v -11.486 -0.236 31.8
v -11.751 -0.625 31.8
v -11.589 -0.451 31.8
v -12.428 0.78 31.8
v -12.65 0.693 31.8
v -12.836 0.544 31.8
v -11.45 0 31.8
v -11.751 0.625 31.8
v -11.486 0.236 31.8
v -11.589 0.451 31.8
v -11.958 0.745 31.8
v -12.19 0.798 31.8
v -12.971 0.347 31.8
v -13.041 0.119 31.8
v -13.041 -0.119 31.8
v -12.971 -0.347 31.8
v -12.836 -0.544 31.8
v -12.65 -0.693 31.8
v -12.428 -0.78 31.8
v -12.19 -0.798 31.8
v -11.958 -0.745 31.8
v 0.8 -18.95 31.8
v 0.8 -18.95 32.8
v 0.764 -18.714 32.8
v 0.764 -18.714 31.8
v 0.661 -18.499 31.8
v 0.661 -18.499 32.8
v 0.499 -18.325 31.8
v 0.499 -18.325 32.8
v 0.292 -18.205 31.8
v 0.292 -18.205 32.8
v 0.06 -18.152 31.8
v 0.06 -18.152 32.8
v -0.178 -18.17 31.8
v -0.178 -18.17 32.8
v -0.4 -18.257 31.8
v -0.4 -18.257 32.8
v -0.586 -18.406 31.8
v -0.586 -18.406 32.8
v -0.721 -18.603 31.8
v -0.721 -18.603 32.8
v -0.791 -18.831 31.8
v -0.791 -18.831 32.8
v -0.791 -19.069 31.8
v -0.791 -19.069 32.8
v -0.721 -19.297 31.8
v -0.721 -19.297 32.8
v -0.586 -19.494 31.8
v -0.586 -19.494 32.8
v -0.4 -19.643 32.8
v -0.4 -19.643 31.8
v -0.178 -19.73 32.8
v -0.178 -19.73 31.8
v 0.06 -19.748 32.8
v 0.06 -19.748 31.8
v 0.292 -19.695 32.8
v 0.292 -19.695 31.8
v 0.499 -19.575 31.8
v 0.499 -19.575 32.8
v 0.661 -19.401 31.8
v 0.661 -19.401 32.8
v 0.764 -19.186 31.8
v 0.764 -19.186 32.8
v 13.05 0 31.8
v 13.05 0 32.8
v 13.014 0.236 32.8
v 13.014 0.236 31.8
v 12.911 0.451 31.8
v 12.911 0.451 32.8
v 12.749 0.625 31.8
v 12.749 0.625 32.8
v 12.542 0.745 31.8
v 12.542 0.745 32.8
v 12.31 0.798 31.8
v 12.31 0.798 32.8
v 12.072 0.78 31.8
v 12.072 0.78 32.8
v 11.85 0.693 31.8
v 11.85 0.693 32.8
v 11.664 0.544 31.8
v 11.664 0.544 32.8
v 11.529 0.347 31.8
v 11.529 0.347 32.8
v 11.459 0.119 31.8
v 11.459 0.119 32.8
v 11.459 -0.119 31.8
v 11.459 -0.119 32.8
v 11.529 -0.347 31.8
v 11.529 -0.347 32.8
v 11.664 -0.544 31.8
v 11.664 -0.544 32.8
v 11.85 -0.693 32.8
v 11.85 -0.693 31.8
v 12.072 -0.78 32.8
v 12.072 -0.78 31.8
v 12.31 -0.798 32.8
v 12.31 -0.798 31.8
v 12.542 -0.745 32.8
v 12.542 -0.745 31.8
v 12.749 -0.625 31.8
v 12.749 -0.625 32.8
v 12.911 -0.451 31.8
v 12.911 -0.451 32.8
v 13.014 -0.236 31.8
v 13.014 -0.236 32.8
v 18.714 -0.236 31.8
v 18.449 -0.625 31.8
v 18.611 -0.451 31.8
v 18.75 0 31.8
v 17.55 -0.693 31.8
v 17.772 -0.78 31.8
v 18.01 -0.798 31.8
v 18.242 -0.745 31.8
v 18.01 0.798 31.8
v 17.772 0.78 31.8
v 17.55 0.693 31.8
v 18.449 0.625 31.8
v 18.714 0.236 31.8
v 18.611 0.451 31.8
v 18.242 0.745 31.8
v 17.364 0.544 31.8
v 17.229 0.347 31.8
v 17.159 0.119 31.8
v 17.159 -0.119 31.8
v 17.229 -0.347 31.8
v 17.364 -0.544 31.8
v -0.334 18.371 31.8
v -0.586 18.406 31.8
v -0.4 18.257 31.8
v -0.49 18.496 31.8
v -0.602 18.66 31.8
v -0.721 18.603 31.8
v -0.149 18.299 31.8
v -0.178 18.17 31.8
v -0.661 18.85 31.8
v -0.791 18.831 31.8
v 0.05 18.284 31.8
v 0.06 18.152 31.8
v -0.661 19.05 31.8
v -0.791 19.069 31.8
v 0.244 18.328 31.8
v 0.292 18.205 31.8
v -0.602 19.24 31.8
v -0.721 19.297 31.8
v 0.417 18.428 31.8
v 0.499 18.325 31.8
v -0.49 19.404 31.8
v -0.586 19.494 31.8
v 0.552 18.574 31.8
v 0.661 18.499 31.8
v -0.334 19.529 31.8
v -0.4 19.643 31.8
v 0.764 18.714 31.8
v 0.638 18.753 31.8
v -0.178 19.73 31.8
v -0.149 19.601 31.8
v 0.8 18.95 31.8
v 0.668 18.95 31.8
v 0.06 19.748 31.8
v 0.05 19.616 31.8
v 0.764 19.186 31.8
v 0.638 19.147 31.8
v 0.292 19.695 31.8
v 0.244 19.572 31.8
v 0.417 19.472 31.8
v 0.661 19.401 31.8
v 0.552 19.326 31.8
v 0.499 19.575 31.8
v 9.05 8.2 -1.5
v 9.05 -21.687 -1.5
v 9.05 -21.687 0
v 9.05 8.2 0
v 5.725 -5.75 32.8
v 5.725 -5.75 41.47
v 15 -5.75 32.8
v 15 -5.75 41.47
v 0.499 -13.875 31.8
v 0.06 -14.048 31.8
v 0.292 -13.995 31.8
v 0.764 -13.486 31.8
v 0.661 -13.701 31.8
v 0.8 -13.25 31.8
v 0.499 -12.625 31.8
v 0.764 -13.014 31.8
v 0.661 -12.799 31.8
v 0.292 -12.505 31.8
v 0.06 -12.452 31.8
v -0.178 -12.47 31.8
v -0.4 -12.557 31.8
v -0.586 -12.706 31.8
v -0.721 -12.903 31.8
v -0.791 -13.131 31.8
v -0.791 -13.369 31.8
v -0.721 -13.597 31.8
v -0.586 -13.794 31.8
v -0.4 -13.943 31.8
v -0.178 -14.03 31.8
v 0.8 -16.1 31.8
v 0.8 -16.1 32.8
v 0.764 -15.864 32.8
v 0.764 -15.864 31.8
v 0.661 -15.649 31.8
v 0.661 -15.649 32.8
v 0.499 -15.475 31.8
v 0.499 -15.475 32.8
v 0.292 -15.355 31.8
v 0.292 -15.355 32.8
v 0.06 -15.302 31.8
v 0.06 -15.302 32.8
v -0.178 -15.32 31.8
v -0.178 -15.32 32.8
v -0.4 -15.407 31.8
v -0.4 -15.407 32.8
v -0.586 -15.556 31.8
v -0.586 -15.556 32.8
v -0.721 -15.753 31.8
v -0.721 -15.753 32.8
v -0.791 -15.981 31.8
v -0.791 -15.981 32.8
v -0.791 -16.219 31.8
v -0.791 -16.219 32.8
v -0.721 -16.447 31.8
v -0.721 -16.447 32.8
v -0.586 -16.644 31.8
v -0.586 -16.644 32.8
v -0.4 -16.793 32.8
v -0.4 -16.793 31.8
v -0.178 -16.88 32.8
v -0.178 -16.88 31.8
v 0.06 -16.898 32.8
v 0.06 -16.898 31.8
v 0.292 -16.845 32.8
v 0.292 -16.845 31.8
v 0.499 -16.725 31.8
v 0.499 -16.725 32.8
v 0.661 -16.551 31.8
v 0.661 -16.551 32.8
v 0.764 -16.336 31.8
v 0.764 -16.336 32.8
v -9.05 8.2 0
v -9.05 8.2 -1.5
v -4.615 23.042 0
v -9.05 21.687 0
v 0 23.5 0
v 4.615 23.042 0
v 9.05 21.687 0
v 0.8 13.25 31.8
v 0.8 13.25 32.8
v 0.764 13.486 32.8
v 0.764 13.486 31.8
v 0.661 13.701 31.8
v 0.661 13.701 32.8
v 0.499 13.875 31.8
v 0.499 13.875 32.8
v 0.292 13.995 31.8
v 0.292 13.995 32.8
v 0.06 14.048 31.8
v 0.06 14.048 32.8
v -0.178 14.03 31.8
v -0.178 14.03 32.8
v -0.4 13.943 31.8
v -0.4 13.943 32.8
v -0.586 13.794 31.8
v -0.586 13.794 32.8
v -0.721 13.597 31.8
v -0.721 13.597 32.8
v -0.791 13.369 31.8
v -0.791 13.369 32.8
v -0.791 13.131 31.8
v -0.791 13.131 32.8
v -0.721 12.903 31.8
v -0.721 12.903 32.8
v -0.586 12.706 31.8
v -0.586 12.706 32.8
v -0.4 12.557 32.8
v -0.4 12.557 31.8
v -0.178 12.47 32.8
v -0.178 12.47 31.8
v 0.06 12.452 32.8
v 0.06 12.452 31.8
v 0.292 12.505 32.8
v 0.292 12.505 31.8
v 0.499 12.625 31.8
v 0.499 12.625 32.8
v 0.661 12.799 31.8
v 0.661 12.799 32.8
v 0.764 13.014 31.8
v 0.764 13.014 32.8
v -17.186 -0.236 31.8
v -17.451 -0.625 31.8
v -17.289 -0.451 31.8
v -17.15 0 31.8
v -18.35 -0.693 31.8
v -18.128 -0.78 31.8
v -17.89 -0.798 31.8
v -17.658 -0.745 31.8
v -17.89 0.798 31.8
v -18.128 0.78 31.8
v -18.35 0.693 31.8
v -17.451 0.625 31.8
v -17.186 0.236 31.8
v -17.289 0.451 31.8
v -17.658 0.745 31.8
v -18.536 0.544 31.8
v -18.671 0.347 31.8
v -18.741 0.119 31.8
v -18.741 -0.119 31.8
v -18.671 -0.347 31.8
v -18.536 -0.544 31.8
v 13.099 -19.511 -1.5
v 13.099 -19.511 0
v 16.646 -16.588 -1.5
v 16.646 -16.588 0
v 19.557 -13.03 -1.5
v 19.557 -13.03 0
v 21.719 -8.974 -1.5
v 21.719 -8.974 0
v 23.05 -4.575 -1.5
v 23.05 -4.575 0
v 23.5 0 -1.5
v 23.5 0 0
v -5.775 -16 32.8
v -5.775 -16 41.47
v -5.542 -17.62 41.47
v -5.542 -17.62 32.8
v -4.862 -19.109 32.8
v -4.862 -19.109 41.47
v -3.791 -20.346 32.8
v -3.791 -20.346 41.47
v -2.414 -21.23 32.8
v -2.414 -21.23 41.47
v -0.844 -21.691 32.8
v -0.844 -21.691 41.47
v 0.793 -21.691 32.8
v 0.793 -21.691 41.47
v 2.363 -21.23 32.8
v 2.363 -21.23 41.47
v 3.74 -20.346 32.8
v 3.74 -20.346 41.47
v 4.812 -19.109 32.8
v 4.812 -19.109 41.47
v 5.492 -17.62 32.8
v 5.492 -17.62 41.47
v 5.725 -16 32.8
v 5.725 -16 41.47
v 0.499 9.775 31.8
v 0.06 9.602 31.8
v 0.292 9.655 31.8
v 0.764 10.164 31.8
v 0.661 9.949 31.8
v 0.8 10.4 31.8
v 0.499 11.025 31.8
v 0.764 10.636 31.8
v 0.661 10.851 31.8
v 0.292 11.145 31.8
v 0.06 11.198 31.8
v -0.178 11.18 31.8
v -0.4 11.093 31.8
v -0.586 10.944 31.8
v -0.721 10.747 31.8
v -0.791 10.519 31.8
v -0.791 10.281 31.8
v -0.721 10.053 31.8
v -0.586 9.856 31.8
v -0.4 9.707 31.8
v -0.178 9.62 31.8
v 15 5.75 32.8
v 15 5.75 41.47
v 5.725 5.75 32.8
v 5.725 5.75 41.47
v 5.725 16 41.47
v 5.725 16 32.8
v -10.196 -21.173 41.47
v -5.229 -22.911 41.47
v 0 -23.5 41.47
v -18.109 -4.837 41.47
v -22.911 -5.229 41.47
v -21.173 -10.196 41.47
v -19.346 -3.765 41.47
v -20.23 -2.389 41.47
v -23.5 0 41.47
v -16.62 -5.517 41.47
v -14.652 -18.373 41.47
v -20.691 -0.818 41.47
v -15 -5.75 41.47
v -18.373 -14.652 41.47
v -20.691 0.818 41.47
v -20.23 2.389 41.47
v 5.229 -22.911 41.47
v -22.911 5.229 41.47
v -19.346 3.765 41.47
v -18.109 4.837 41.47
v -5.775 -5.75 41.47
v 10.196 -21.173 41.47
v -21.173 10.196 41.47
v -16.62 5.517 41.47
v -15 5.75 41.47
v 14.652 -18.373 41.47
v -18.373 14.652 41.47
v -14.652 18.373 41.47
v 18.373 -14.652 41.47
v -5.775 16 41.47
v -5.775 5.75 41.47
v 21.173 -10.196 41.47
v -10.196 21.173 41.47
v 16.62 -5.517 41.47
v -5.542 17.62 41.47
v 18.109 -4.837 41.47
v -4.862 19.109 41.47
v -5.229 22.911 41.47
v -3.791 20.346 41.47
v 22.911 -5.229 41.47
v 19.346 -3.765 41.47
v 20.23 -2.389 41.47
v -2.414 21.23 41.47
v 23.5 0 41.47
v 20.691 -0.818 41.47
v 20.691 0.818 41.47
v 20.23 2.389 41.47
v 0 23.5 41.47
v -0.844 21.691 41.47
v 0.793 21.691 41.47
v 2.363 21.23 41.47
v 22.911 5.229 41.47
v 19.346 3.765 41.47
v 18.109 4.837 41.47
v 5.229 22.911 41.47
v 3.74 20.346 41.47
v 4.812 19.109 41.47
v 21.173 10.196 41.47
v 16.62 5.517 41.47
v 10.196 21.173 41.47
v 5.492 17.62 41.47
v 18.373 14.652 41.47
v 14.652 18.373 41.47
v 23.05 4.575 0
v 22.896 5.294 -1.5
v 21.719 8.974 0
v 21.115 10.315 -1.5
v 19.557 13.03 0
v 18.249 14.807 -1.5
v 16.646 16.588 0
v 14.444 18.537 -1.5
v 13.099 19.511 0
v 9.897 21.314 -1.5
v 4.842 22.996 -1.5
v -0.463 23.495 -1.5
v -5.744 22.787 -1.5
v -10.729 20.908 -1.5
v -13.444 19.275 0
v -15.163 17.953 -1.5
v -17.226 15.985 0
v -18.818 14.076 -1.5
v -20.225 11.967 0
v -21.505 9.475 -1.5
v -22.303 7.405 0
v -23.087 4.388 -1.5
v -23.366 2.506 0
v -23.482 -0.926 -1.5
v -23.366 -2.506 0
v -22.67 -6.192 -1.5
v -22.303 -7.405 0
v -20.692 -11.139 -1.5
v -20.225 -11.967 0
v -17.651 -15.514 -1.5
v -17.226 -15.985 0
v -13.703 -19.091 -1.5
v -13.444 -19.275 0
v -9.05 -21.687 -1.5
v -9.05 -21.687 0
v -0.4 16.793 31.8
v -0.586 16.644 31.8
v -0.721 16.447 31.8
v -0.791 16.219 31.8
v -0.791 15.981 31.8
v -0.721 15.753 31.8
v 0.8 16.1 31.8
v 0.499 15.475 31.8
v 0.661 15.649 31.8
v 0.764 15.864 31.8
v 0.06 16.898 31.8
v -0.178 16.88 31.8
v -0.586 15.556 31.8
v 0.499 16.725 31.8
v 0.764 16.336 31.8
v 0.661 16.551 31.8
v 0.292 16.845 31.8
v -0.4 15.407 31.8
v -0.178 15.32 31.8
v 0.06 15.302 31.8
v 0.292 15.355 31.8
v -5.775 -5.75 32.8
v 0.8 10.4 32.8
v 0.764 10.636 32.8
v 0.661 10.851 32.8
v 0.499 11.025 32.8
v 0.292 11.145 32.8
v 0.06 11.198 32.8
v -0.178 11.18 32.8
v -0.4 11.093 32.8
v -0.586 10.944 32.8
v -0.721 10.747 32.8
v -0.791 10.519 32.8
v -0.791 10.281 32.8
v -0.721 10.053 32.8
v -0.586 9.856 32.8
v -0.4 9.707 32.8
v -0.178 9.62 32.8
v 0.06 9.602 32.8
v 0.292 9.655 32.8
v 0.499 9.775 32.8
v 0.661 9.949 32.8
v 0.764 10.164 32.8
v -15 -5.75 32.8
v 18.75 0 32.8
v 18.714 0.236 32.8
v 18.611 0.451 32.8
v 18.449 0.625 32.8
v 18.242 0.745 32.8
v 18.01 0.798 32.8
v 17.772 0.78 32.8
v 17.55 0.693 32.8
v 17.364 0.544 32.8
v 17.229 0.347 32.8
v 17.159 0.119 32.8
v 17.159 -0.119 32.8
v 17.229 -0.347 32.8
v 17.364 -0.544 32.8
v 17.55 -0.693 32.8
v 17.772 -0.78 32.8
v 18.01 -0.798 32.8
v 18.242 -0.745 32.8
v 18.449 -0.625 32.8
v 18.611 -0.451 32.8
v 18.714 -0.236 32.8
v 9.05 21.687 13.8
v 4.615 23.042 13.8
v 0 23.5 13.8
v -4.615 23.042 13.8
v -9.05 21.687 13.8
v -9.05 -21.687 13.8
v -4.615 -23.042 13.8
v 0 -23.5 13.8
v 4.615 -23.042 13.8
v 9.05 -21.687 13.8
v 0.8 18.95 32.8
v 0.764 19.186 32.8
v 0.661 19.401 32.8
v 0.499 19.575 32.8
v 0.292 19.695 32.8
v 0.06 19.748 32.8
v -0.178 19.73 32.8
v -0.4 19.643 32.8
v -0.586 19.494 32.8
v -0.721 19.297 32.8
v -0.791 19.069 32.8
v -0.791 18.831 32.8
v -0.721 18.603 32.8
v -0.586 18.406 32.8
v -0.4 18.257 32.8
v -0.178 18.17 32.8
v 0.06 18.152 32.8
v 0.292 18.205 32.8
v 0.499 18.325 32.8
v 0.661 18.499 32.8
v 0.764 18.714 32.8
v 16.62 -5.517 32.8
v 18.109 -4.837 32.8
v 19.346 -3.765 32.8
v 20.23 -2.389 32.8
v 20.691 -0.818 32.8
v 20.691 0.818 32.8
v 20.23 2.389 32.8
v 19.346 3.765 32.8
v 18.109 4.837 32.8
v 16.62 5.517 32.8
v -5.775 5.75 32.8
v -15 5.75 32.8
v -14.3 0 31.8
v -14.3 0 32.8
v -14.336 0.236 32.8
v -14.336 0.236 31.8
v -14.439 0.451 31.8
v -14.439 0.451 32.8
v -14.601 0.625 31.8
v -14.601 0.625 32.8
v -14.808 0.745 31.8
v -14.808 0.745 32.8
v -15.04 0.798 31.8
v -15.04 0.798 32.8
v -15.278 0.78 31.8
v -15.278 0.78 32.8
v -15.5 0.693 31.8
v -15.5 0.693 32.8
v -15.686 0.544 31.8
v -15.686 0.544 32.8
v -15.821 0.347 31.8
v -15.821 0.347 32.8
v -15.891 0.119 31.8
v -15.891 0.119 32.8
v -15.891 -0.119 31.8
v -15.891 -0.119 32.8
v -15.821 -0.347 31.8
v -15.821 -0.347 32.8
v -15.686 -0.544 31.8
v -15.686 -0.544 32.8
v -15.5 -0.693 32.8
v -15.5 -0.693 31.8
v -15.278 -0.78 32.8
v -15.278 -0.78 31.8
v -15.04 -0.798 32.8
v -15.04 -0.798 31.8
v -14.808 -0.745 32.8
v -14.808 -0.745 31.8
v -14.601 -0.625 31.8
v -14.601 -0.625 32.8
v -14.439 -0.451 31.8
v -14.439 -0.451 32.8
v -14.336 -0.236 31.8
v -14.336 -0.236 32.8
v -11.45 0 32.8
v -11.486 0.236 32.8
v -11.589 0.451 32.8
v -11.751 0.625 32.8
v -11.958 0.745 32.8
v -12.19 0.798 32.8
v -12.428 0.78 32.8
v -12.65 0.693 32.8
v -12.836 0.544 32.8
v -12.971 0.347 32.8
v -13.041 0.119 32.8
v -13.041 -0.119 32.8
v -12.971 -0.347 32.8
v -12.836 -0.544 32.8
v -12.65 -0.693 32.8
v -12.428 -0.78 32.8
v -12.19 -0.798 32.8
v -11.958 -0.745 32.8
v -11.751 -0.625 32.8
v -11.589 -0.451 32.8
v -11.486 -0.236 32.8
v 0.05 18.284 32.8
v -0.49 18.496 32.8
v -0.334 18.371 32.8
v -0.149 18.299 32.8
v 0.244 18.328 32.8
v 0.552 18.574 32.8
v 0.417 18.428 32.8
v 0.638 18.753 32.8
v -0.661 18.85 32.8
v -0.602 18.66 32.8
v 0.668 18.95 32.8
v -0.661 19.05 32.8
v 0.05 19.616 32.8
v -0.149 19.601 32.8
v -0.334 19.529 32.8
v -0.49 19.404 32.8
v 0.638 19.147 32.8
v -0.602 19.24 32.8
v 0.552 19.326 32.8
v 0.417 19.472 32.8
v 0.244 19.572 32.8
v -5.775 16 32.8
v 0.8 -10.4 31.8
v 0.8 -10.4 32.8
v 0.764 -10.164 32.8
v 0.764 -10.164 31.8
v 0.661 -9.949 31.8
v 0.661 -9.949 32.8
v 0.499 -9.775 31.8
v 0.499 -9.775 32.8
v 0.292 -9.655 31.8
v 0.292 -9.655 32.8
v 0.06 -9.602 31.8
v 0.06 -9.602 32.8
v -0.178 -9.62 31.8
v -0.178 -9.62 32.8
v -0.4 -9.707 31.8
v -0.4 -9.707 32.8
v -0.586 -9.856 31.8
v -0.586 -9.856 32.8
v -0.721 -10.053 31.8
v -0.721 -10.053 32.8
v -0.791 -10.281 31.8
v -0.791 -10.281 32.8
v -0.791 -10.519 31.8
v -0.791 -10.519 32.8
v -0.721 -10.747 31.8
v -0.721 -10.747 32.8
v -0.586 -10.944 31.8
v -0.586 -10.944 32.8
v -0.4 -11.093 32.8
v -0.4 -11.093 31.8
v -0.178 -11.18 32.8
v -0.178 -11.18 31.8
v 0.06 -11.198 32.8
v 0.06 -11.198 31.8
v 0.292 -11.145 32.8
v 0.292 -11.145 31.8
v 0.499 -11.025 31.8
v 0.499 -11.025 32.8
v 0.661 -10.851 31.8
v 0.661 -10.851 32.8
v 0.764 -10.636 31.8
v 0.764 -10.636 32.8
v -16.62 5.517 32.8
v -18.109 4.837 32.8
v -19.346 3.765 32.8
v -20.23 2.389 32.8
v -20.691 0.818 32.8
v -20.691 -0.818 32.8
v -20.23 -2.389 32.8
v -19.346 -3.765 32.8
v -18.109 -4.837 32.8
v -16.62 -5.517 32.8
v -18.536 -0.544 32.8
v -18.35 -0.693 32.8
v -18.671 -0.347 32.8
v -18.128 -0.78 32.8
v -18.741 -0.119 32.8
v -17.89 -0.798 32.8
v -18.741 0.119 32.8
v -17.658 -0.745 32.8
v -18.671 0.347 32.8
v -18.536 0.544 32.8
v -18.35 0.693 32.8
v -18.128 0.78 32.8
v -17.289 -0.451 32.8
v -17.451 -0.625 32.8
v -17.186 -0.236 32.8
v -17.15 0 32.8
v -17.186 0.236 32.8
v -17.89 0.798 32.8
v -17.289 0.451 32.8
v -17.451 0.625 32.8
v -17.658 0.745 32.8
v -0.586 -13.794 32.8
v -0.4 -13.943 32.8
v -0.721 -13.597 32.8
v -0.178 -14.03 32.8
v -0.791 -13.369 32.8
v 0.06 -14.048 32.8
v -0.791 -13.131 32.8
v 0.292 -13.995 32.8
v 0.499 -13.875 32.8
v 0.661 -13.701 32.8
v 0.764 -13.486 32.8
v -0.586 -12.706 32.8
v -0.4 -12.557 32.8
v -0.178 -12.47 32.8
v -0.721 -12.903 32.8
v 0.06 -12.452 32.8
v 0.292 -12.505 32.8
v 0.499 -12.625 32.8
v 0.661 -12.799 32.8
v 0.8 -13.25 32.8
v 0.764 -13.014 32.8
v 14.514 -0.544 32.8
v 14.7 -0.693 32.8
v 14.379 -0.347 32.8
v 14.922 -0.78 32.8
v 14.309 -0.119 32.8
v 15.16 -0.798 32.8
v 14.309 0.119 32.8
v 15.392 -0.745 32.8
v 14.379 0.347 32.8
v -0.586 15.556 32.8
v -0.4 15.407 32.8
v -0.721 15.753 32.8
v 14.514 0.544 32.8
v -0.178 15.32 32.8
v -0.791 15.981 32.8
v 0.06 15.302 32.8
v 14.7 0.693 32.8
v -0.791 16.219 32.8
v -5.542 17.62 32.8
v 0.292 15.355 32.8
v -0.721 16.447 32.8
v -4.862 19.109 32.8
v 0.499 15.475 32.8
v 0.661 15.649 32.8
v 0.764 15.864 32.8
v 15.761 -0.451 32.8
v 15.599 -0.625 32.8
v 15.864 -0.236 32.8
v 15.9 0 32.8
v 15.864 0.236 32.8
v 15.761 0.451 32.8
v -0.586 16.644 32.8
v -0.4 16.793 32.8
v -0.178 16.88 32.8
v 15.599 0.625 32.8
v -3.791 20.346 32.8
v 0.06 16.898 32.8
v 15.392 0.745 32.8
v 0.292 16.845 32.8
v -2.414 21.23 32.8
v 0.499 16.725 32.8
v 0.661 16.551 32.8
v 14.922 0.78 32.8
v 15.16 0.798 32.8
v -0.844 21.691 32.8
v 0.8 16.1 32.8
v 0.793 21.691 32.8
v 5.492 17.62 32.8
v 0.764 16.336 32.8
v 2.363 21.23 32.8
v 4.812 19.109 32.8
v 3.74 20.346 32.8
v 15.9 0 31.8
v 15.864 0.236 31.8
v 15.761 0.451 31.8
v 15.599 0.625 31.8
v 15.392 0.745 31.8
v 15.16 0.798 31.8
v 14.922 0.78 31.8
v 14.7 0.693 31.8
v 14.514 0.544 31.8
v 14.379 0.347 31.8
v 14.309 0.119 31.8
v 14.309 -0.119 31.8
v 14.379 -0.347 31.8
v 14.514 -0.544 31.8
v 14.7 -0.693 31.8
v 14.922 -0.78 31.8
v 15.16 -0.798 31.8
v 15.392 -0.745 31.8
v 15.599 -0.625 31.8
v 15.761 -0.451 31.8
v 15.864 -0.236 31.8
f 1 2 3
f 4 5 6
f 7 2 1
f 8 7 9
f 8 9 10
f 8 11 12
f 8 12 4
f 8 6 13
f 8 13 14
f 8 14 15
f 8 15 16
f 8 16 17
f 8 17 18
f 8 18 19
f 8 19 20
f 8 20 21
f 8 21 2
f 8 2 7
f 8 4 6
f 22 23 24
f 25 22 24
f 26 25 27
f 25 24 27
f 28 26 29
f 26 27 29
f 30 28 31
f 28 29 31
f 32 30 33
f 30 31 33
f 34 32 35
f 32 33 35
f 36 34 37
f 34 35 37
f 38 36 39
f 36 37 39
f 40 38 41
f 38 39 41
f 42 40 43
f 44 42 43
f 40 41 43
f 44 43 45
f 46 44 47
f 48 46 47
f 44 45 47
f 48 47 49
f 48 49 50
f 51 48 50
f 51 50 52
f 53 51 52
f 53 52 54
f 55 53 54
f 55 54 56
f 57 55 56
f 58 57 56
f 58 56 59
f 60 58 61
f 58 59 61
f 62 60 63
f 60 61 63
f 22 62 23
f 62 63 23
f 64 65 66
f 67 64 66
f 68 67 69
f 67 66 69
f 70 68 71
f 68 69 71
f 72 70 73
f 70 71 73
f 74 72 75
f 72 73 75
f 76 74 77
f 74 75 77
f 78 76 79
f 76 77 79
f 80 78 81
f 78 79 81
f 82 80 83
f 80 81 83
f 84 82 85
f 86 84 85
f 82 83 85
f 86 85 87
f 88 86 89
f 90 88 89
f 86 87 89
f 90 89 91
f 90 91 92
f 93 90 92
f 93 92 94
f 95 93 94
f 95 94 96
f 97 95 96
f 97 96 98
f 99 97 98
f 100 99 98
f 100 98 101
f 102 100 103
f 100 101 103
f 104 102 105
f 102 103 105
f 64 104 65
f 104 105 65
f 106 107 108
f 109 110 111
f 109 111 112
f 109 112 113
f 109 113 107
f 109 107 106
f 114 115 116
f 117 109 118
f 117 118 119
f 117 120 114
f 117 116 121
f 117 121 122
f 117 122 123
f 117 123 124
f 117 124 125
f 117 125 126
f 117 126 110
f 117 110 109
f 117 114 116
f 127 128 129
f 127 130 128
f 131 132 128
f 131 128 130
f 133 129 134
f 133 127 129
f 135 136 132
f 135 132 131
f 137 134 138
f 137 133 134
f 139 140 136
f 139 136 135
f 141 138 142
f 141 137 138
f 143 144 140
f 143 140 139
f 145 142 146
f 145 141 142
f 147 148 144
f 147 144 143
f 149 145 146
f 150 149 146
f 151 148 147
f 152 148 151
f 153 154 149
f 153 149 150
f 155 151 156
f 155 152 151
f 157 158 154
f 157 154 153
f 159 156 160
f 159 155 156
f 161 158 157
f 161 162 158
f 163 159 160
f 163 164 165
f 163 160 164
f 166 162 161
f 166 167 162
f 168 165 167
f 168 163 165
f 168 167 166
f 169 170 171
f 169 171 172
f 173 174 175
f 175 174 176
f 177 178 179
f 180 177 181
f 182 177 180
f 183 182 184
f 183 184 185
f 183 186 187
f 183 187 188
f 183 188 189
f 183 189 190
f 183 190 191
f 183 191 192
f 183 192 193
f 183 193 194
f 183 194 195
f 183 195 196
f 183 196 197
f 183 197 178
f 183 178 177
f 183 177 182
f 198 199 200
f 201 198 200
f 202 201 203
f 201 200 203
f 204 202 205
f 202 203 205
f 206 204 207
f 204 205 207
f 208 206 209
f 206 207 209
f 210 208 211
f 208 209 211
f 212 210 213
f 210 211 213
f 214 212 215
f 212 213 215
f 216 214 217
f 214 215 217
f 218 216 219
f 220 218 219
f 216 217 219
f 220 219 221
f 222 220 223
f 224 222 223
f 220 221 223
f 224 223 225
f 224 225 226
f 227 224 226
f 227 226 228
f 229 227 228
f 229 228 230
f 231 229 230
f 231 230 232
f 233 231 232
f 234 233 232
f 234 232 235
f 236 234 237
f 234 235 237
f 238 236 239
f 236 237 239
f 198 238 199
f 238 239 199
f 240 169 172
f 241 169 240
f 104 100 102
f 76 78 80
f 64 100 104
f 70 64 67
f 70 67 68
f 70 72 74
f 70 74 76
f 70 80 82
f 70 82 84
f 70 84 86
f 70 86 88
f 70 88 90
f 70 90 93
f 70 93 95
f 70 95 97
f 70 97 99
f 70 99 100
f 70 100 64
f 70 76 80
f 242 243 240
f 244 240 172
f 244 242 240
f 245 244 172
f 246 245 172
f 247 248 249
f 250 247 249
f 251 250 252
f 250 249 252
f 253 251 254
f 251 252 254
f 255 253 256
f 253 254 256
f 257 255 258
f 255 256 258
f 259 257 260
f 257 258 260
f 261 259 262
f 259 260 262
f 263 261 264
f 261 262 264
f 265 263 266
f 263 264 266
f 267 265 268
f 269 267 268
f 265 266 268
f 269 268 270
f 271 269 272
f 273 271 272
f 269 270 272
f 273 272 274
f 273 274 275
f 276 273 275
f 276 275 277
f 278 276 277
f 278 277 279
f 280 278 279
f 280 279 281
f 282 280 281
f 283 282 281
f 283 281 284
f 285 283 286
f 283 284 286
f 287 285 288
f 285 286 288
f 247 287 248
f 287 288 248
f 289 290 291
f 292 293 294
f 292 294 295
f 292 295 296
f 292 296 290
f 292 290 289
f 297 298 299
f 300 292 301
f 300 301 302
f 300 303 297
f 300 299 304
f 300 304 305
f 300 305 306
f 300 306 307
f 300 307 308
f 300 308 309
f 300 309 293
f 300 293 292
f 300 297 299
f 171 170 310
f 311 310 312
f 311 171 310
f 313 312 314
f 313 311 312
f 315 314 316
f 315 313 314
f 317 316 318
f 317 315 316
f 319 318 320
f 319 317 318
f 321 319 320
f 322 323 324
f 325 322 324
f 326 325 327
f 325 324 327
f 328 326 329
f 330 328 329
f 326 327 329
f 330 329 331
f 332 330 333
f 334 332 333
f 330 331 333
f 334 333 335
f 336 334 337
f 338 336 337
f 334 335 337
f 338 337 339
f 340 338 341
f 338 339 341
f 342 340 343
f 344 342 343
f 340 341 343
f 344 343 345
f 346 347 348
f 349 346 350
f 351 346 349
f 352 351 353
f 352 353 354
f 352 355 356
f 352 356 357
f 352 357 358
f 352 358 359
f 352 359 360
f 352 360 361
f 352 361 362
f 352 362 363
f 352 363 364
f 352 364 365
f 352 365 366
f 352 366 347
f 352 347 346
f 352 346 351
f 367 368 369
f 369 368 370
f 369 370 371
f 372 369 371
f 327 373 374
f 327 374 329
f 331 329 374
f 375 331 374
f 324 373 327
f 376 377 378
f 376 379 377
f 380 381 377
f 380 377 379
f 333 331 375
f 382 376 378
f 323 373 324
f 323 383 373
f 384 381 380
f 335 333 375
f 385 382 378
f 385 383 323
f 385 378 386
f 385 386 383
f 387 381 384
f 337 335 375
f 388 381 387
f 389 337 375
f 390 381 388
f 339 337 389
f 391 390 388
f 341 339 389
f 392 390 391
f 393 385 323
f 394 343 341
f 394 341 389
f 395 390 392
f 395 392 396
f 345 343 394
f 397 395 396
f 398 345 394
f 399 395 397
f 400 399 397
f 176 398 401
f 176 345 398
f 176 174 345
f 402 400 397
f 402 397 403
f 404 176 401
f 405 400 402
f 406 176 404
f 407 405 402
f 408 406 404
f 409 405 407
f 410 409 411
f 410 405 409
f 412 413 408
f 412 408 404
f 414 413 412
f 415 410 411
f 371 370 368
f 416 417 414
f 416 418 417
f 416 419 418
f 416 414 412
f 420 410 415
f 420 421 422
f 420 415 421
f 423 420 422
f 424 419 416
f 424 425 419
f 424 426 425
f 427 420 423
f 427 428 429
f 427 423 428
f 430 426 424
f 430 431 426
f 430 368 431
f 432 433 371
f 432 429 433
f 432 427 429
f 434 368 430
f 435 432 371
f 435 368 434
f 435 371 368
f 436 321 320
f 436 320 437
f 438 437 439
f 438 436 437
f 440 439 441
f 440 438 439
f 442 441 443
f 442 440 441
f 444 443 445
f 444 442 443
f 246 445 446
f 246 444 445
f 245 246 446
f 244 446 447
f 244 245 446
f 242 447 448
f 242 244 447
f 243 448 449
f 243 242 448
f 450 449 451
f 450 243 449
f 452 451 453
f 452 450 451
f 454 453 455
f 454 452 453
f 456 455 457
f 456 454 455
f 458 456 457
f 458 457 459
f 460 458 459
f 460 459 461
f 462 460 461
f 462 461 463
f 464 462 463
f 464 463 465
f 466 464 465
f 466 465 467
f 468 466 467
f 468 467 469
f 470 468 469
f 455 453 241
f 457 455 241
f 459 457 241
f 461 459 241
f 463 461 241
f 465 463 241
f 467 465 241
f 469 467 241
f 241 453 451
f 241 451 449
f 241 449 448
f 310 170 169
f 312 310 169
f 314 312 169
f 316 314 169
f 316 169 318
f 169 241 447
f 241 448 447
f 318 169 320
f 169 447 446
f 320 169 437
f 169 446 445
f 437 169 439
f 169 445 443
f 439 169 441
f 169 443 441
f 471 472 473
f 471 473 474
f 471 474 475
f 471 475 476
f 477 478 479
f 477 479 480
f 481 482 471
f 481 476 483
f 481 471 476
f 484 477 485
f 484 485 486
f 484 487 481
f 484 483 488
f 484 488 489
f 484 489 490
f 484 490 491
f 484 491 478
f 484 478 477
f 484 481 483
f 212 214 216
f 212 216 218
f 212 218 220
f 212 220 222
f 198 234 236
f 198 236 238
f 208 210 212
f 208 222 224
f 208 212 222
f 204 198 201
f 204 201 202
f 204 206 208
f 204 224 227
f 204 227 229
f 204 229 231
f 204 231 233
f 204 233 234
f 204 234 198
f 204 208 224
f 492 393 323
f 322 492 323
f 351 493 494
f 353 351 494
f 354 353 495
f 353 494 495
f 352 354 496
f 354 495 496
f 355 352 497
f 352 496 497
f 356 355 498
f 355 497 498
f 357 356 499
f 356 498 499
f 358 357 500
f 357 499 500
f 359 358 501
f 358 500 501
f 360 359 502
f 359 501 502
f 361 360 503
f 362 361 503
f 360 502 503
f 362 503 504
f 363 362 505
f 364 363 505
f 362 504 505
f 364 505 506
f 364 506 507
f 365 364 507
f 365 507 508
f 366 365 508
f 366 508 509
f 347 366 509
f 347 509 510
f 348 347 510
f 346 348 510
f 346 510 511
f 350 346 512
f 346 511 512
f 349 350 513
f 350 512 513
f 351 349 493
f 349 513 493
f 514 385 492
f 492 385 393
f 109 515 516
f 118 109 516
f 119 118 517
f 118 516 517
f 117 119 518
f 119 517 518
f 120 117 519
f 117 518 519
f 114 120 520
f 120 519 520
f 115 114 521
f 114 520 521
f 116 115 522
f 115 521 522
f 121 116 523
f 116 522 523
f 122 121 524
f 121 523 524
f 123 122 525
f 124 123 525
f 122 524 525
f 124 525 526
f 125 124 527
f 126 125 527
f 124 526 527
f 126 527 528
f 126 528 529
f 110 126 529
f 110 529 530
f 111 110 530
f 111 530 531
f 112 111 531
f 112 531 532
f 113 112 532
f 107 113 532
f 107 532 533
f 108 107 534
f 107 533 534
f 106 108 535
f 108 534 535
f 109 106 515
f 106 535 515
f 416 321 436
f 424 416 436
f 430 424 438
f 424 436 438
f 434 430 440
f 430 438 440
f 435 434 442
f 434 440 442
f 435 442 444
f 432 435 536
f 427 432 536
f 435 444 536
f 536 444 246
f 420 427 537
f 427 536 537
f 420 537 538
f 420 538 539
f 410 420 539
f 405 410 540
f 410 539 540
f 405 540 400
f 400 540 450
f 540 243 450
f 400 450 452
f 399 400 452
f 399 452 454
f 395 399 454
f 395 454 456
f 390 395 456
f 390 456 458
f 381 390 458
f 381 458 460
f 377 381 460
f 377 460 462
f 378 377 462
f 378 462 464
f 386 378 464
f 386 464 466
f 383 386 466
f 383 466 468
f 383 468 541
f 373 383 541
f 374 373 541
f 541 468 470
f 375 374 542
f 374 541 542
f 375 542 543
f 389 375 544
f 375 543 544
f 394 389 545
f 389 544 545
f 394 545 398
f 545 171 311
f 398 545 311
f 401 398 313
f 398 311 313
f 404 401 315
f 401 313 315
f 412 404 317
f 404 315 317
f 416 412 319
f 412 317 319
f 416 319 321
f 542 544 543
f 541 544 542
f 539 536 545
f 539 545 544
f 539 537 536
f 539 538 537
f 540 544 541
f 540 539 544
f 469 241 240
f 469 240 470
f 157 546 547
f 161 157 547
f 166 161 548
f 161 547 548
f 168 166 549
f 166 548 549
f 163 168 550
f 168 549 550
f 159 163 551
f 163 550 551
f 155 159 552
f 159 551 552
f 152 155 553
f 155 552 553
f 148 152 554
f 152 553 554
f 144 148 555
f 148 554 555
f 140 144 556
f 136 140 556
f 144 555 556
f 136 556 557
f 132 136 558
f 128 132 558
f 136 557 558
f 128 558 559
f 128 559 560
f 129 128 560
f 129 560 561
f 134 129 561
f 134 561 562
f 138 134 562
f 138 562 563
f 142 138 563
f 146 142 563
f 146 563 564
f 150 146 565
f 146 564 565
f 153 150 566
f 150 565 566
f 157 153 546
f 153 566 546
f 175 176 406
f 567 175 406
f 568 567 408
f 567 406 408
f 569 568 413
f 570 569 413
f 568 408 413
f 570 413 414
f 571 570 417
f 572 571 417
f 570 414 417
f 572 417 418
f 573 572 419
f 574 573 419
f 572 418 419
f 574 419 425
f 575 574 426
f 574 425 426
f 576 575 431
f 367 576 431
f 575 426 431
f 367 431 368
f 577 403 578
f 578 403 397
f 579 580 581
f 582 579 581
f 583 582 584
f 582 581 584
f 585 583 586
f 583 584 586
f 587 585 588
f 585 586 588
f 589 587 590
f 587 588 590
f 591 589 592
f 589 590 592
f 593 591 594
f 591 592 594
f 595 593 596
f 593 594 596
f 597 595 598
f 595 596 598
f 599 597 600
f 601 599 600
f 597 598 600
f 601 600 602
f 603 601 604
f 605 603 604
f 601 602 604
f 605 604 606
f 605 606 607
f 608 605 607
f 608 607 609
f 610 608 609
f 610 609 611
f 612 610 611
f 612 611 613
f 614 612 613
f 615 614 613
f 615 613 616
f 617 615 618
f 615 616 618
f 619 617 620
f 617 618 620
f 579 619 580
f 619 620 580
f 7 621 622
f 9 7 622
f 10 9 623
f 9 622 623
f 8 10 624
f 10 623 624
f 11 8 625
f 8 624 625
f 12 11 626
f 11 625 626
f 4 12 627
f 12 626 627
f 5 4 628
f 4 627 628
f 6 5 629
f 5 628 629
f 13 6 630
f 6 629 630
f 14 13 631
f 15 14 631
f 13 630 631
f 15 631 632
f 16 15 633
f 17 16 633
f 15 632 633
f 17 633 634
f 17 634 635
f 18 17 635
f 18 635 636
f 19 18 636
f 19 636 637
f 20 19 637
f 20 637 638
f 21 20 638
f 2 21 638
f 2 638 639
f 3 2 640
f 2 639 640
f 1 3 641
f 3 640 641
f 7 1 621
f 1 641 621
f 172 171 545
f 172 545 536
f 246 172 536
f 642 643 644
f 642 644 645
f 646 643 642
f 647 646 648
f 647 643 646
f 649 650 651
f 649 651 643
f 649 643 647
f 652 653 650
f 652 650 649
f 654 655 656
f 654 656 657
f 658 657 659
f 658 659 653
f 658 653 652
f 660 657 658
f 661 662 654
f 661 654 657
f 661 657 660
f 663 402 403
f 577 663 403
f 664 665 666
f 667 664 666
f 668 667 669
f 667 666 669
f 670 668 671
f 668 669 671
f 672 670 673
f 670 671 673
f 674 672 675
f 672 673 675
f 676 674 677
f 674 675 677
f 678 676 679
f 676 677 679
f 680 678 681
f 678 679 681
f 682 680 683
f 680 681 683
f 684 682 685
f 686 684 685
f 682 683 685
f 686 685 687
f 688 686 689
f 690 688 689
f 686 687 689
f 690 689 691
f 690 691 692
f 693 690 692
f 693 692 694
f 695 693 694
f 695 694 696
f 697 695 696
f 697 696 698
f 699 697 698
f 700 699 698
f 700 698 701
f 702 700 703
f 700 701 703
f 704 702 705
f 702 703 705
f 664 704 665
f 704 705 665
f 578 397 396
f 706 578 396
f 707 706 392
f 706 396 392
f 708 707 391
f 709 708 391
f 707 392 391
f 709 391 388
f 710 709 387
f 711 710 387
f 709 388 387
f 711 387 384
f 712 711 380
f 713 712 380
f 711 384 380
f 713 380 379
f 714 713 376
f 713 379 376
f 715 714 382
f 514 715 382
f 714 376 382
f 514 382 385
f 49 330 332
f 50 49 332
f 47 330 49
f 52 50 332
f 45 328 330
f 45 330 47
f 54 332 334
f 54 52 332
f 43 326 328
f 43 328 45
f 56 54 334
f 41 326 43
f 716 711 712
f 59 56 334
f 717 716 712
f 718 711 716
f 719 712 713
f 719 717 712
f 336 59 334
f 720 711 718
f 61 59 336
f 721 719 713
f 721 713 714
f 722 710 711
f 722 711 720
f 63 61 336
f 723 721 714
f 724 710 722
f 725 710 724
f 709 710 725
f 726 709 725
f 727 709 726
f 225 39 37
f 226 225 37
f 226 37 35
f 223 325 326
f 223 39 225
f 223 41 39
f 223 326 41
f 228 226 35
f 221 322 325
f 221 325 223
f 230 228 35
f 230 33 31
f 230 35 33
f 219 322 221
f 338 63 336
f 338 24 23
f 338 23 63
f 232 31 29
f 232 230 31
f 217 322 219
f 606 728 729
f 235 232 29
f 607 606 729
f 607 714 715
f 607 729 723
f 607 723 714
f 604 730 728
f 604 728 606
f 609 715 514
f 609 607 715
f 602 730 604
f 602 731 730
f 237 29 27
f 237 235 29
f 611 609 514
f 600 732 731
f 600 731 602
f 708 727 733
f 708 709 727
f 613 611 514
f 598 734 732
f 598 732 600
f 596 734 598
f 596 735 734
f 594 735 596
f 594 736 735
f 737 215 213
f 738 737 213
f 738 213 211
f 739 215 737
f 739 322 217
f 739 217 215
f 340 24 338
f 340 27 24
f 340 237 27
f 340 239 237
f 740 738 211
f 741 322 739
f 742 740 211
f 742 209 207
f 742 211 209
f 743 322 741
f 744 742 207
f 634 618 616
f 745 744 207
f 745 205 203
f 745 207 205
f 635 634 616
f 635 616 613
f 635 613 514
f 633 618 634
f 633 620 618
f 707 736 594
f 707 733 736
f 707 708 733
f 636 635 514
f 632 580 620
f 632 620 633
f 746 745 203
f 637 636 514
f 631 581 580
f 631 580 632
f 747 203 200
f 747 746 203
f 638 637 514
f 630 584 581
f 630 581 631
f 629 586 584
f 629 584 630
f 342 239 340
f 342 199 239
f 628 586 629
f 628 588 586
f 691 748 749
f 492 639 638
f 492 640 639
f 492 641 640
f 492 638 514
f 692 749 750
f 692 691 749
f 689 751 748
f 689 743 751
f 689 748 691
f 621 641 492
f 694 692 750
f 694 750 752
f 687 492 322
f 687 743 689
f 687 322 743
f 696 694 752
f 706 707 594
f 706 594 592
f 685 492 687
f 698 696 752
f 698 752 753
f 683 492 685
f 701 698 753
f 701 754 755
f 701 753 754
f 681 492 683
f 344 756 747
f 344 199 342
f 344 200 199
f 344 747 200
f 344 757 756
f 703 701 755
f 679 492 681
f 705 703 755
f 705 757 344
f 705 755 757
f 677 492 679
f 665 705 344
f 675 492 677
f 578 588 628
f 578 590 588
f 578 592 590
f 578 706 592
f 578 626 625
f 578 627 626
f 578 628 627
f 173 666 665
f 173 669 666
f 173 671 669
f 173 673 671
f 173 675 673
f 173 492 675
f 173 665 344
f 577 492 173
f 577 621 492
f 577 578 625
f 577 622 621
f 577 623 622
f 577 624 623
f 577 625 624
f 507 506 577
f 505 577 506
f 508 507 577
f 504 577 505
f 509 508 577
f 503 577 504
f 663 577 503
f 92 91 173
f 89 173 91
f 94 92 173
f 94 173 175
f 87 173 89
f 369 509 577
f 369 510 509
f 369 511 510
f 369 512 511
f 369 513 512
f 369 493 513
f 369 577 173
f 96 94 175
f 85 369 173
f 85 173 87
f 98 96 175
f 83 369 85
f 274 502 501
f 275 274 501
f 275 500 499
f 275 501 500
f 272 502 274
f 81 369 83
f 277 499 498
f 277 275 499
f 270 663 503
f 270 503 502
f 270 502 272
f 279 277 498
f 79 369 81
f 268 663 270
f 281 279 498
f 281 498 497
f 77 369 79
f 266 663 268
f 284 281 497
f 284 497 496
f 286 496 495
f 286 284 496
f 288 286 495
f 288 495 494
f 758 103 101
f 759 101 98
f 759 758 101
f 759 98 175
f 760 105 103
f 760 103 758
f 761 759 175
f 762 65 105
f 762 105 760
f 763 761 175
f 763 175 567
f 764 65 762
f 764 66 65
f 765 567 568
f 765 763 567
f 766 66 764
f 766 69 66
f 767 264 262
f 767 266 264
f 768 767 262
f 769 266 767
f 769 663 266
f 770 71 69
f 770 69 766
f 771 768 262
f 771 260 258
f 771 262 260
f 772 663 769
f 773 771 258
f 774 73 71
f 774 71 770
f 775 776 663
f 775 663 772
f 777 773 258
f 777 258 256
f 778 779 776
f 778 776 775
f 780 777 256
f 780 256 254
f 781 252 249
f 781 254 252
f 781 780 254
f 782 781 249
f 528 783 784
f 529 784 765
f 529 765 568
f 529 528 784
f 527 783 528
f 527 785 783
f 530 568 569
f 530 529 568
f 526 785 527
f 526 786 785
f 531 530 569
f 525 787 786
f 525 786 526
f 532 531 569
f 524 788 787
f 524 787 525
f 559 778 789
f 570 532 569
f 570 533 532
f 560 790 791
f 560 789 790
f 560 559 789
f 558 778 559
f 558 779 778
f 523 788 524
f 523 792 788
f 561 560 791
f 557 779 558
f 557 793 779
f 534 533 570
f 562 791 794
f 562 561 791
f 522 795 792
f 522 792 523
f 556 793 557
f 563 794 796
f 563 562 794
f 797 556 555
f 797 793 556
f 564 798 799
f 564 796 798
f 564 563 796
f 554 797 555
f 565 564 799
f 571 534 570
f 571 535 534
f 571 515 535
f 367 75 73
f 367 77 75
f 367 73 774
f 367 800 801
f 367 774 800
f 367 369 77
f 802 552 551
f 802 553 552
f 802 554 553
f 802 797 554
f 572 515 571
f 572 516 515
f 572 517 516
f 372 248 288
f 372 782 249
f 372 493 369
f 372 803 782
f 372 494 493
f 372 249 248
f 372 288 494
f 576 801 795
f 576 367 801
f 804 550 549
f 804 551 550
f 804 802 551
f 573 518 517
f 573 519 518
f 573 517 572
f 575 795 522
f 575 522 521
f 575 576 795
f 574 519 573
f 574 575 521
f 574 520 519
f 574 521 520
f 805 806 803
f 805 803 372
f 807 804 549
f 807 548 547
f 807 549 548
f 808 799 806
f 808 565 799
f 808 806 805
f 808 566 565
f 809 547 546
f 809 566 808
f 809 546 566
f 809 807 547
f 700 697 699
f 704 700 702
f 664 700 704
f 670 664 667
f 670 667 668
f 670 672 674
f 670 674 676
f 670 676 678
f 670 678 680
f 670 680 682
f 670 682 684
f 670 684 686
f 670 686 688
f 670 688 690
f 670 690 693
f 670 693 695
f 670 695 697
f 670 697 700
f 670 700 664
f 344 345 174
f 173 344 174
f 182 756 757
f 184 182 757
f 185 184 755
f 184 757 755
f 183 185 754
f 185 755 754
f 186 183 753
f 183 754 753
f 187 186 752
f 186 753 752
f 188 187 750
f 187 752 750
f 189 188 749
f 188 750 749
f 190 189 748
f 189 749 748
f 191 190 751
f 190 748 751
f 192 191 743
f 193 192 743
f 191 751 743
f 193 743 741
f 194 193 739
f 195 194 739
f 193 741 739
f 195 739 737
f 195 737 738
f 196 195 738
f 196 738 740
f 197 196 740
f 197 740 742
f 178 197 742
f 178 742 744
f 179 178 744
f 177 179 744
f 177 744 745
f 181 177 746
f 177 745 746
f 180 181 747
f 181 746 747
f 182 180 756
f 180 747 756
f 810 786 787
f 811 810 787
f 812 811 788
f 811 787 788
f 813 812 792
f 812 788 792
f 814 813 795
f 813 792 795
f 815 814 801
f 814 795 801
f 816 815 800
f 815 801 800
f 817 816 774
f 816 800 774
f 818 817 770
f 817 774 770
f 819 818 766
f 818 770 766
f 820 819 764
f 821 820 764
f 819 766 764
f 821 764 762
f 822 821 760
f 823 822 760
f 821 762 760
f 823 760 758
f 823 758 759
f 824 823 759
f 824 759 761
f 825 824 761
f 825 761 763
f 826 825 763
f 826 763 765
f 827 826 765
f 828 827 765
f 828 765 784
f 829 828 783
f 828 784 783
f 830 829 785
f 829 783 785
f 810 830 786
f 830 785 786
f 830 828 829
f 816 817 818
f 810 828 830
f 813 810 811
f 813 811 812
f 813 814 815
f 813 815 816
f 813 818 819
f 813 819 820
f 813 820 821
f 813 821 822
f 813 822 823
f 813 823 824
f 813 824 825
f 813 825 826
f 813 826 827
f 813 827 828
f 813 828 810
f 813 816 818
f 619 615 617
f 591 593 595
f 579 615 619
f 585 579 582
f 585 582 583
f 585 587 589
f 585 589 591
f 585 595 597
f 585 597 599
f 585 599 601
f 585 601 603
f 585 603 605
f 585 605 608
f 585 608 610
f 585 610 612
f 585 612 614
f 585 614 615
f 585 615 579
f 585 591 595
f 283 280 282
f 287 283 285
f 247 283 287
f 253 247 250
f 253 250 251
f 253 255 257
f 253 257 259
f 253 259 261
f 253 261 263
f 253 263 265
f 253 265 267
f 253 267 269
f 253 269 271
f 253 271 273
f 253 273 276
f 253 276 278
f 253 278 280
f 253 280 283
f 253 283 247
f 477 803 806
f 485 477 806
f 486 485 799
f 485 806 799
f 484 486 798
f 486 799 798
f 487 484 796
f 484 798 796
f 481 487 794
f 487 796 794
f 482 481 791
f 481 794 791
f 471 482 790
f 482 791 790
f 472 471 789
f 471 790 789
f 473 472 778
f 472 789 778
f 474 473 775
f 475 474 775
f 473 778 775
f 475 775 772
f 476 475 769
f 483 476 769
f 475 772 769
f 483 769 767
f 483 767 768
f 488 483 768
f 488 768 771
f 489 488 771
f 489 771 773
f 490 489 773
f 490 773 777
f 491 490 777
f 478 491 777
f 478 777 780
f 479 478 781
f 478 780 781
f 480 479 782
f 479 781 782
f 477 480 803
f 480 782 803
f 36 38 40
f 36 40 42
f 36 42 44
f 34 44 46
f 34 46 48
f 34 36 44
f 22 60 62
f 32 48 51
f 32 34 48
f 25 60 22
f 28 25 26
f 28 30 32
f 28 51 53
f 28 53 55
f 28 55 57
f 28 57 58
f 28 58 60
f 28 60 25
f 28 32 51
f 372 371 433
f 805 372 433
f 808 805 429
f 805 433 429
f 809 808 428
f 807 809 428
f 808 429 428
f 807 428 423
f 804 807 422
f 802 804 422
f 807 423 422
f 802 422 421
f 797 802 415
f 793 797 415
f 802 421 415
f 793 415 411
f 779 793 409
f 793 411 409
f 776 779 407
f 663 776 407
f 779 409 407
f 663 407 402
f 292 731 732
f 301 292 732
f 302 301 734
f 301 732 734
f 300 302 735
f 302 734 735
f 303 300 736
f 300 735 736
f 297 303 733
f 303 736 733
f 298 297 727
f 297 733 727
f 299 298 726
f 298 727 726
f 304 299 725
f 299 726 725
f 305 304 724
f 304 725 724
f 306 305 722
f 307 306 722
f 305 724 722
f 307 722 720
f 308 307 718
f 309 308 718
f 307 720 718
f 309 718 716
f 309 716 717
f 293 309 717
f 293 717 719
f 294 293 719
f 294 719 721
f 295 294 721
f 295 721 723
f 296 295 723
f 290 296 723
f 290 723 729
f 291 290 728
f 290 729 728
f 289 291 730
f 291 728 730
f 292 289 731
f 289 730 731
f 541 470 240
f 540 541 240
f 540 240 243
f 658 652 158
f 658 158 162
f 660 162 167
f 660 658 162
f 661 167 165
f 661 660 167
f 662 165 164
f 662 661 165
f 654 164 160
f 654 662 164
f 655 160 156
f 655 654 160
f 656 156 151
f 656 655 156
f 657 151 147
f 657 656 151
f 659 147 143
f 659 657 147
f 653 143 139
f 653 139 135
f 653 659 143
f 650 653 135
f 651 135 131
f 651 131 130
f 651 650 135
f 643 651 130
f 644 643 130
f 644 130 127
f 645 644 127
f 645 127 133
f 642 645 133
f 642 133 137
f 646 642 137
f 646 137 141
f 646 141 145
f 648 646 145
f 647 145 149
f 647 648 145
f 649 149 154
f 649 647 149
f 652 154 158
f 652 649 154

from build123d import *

# Parameters (mm, degrees)
SKETCH1_R           = 23.5
BOSS_EXTRUDE1_DEPTH = 41.47
SKETCH5_W           = 18.1
SKETCH5_H           = 47
CUT_EXTRUDE1_DEPTH  = 13.8
SKETCH6_R           = 23.5
BOSS_EXTRUDE2_DEPTH = 1.5
CUT_EXTRUDE5_DEPTH  = 1.5
CUT_EXTRUDE10_DEPTH = 8.67
SKETCH14_R          = 0.8
SKETCH14_R_2        = 0.668140713
CUT_EXTRUDE12_DEPTH = 1


with BuildPart() as part:
    # Sketch1 → Boss-Extrude1 (new body)
    with BuildSketch(Plane.XY):
        Circle(SKETCH1_R)
    extrude(amount=BOSS_EXTRUDE1_DEPTH)

    # Sketch5 → Cut-Extrude1 (cut)
    with BuildSketch(Plane(origin=(0, 0, 0), x_dir=(-1, 0, 0), z_dir=(0, 0, -1))):
        Rectangle(SKETCH5_W, SKETCH5_H)
    extrude(amount=-CUT_EXTRUDE1_DEPTH, mode=Mode.SUBTRACT)

    # Sketch6 → Boss-Extrude2 (add)
    with BuildSketch(Plane.XY):
        Circle(SKETCH6_R)
    extrude(amount=-BOSS_EXTRUDE2_DEPTH)

    # Sketch8 → Cut-Extrude5 (cut)
    with BuildSketch(Plane(origin=(0, 0, -1.5), x_dir=(-1, 0, 0), z_dir=(0, 0, -1))):
        with BuildLine():
            Line((-9.05, 8.2), (9.05, 8.2))
            Line((9.05, 8.2), (9.05, -21.687496398))
            ThreePointArc((9.05, -21.687496398), (0, -23.5), (-9.05, -21.687496398))
            Line((-9.05, -21.687496398), (-9.05, 8.2))
        make_face()
    extrude(amount=-CUT_EXTRUDE5_DEPTH, mode=Mode.SUBTRACT)

    # Sketch9 → Cut-Extrude10 (cut)
    with BuildSketch(Plane.XY.offset(41.47)):
        with BuildLine():
            Line((-5.775203881, 16), (-5.775203881, 5.75))
            Line((-5.775203881, 5.75), (-15, 5.75))
            ThreePointArc((-15, 5.75), (-20.75, 0), (-15, -5.75))
            Line((-15, -5.75), (-5.775203881, -5.75))
            Line((-5.775203881, -5.75), (-5.775203881, -16))
            ThreePointArc((-5.775203881, -16), (-0.025205722, -21.749998159), (5.724792437, -16))
            Line((5.724792437, -16), (5.724792437, -5.75))
            Line((5.724792437, -5.75), (15, -5.75))
            ThreePointArc((15, -5.75), (20.75, 0), (15, 5.75))
            Line((15, 5.75), (5.724792437, 5.75))
            Line((5.724792437, 5.75), (5.724792437, 16))
            ThreePointArc((5.724792437, 16), (-0.025205722, 21.749998159), (-5.775203881, 16))
        make_face()
    extrude(amount=-CUT_EXTRUDE10_DEPTH, mode=Mode.SUBTRACT)

    # Sketch14 → Cut-Extrude12 (cut)
    with BuildSketch(Plane.XY.offset(32.8)):
        with Locations((0, 18.949998159)):
            Circle(SKETCH14_R)
        with Locations((0, 18.949998159)):
            Circle(SKETCH14_R_2, mode=Mode.SUBTRACT)
        with Locations((0, 10.399998159)):
            Circle(SKETCH14_R)
        with Locations((0, 13.249998159)):
            Circle(SKETCH14_R)
        with Locations((0, 16.099998159)):
            Circle(SKETCH14_R)
        with Locations((0, -10.399998159)):
            Circle(SKETCH14_R)
        with Locations((0, -13.249998159)):
            Circle(SKETCH14_R)
        with Locations((0, -16.099998159)):
            Circle(SKETCH14_R)
        with Locations((0, -18.949998159)):
            Circle(SKETCH14_R)
        with Locations((12.25, 0)):
            Circle(SKETCH14_R)
        with Locations((15.1, 0)):
            Circle(SKETCH14_R)
        with Locations((17.95, 0)):
            Circle(SKETCH14_R)
        with Locations((-12.25, 0)):
            Circle(SKETCH14_R)
        with Locations((-15.1, 0)):
            Circle(SKETCH14_R)
        with Locations((-17.95, 0)):
            Circle(SKETCH14_R)
    extrude(amount=-CUT_EXTRUDE12_DEPTH, mode=Mode.SUBTRACT)


solid = part.part
